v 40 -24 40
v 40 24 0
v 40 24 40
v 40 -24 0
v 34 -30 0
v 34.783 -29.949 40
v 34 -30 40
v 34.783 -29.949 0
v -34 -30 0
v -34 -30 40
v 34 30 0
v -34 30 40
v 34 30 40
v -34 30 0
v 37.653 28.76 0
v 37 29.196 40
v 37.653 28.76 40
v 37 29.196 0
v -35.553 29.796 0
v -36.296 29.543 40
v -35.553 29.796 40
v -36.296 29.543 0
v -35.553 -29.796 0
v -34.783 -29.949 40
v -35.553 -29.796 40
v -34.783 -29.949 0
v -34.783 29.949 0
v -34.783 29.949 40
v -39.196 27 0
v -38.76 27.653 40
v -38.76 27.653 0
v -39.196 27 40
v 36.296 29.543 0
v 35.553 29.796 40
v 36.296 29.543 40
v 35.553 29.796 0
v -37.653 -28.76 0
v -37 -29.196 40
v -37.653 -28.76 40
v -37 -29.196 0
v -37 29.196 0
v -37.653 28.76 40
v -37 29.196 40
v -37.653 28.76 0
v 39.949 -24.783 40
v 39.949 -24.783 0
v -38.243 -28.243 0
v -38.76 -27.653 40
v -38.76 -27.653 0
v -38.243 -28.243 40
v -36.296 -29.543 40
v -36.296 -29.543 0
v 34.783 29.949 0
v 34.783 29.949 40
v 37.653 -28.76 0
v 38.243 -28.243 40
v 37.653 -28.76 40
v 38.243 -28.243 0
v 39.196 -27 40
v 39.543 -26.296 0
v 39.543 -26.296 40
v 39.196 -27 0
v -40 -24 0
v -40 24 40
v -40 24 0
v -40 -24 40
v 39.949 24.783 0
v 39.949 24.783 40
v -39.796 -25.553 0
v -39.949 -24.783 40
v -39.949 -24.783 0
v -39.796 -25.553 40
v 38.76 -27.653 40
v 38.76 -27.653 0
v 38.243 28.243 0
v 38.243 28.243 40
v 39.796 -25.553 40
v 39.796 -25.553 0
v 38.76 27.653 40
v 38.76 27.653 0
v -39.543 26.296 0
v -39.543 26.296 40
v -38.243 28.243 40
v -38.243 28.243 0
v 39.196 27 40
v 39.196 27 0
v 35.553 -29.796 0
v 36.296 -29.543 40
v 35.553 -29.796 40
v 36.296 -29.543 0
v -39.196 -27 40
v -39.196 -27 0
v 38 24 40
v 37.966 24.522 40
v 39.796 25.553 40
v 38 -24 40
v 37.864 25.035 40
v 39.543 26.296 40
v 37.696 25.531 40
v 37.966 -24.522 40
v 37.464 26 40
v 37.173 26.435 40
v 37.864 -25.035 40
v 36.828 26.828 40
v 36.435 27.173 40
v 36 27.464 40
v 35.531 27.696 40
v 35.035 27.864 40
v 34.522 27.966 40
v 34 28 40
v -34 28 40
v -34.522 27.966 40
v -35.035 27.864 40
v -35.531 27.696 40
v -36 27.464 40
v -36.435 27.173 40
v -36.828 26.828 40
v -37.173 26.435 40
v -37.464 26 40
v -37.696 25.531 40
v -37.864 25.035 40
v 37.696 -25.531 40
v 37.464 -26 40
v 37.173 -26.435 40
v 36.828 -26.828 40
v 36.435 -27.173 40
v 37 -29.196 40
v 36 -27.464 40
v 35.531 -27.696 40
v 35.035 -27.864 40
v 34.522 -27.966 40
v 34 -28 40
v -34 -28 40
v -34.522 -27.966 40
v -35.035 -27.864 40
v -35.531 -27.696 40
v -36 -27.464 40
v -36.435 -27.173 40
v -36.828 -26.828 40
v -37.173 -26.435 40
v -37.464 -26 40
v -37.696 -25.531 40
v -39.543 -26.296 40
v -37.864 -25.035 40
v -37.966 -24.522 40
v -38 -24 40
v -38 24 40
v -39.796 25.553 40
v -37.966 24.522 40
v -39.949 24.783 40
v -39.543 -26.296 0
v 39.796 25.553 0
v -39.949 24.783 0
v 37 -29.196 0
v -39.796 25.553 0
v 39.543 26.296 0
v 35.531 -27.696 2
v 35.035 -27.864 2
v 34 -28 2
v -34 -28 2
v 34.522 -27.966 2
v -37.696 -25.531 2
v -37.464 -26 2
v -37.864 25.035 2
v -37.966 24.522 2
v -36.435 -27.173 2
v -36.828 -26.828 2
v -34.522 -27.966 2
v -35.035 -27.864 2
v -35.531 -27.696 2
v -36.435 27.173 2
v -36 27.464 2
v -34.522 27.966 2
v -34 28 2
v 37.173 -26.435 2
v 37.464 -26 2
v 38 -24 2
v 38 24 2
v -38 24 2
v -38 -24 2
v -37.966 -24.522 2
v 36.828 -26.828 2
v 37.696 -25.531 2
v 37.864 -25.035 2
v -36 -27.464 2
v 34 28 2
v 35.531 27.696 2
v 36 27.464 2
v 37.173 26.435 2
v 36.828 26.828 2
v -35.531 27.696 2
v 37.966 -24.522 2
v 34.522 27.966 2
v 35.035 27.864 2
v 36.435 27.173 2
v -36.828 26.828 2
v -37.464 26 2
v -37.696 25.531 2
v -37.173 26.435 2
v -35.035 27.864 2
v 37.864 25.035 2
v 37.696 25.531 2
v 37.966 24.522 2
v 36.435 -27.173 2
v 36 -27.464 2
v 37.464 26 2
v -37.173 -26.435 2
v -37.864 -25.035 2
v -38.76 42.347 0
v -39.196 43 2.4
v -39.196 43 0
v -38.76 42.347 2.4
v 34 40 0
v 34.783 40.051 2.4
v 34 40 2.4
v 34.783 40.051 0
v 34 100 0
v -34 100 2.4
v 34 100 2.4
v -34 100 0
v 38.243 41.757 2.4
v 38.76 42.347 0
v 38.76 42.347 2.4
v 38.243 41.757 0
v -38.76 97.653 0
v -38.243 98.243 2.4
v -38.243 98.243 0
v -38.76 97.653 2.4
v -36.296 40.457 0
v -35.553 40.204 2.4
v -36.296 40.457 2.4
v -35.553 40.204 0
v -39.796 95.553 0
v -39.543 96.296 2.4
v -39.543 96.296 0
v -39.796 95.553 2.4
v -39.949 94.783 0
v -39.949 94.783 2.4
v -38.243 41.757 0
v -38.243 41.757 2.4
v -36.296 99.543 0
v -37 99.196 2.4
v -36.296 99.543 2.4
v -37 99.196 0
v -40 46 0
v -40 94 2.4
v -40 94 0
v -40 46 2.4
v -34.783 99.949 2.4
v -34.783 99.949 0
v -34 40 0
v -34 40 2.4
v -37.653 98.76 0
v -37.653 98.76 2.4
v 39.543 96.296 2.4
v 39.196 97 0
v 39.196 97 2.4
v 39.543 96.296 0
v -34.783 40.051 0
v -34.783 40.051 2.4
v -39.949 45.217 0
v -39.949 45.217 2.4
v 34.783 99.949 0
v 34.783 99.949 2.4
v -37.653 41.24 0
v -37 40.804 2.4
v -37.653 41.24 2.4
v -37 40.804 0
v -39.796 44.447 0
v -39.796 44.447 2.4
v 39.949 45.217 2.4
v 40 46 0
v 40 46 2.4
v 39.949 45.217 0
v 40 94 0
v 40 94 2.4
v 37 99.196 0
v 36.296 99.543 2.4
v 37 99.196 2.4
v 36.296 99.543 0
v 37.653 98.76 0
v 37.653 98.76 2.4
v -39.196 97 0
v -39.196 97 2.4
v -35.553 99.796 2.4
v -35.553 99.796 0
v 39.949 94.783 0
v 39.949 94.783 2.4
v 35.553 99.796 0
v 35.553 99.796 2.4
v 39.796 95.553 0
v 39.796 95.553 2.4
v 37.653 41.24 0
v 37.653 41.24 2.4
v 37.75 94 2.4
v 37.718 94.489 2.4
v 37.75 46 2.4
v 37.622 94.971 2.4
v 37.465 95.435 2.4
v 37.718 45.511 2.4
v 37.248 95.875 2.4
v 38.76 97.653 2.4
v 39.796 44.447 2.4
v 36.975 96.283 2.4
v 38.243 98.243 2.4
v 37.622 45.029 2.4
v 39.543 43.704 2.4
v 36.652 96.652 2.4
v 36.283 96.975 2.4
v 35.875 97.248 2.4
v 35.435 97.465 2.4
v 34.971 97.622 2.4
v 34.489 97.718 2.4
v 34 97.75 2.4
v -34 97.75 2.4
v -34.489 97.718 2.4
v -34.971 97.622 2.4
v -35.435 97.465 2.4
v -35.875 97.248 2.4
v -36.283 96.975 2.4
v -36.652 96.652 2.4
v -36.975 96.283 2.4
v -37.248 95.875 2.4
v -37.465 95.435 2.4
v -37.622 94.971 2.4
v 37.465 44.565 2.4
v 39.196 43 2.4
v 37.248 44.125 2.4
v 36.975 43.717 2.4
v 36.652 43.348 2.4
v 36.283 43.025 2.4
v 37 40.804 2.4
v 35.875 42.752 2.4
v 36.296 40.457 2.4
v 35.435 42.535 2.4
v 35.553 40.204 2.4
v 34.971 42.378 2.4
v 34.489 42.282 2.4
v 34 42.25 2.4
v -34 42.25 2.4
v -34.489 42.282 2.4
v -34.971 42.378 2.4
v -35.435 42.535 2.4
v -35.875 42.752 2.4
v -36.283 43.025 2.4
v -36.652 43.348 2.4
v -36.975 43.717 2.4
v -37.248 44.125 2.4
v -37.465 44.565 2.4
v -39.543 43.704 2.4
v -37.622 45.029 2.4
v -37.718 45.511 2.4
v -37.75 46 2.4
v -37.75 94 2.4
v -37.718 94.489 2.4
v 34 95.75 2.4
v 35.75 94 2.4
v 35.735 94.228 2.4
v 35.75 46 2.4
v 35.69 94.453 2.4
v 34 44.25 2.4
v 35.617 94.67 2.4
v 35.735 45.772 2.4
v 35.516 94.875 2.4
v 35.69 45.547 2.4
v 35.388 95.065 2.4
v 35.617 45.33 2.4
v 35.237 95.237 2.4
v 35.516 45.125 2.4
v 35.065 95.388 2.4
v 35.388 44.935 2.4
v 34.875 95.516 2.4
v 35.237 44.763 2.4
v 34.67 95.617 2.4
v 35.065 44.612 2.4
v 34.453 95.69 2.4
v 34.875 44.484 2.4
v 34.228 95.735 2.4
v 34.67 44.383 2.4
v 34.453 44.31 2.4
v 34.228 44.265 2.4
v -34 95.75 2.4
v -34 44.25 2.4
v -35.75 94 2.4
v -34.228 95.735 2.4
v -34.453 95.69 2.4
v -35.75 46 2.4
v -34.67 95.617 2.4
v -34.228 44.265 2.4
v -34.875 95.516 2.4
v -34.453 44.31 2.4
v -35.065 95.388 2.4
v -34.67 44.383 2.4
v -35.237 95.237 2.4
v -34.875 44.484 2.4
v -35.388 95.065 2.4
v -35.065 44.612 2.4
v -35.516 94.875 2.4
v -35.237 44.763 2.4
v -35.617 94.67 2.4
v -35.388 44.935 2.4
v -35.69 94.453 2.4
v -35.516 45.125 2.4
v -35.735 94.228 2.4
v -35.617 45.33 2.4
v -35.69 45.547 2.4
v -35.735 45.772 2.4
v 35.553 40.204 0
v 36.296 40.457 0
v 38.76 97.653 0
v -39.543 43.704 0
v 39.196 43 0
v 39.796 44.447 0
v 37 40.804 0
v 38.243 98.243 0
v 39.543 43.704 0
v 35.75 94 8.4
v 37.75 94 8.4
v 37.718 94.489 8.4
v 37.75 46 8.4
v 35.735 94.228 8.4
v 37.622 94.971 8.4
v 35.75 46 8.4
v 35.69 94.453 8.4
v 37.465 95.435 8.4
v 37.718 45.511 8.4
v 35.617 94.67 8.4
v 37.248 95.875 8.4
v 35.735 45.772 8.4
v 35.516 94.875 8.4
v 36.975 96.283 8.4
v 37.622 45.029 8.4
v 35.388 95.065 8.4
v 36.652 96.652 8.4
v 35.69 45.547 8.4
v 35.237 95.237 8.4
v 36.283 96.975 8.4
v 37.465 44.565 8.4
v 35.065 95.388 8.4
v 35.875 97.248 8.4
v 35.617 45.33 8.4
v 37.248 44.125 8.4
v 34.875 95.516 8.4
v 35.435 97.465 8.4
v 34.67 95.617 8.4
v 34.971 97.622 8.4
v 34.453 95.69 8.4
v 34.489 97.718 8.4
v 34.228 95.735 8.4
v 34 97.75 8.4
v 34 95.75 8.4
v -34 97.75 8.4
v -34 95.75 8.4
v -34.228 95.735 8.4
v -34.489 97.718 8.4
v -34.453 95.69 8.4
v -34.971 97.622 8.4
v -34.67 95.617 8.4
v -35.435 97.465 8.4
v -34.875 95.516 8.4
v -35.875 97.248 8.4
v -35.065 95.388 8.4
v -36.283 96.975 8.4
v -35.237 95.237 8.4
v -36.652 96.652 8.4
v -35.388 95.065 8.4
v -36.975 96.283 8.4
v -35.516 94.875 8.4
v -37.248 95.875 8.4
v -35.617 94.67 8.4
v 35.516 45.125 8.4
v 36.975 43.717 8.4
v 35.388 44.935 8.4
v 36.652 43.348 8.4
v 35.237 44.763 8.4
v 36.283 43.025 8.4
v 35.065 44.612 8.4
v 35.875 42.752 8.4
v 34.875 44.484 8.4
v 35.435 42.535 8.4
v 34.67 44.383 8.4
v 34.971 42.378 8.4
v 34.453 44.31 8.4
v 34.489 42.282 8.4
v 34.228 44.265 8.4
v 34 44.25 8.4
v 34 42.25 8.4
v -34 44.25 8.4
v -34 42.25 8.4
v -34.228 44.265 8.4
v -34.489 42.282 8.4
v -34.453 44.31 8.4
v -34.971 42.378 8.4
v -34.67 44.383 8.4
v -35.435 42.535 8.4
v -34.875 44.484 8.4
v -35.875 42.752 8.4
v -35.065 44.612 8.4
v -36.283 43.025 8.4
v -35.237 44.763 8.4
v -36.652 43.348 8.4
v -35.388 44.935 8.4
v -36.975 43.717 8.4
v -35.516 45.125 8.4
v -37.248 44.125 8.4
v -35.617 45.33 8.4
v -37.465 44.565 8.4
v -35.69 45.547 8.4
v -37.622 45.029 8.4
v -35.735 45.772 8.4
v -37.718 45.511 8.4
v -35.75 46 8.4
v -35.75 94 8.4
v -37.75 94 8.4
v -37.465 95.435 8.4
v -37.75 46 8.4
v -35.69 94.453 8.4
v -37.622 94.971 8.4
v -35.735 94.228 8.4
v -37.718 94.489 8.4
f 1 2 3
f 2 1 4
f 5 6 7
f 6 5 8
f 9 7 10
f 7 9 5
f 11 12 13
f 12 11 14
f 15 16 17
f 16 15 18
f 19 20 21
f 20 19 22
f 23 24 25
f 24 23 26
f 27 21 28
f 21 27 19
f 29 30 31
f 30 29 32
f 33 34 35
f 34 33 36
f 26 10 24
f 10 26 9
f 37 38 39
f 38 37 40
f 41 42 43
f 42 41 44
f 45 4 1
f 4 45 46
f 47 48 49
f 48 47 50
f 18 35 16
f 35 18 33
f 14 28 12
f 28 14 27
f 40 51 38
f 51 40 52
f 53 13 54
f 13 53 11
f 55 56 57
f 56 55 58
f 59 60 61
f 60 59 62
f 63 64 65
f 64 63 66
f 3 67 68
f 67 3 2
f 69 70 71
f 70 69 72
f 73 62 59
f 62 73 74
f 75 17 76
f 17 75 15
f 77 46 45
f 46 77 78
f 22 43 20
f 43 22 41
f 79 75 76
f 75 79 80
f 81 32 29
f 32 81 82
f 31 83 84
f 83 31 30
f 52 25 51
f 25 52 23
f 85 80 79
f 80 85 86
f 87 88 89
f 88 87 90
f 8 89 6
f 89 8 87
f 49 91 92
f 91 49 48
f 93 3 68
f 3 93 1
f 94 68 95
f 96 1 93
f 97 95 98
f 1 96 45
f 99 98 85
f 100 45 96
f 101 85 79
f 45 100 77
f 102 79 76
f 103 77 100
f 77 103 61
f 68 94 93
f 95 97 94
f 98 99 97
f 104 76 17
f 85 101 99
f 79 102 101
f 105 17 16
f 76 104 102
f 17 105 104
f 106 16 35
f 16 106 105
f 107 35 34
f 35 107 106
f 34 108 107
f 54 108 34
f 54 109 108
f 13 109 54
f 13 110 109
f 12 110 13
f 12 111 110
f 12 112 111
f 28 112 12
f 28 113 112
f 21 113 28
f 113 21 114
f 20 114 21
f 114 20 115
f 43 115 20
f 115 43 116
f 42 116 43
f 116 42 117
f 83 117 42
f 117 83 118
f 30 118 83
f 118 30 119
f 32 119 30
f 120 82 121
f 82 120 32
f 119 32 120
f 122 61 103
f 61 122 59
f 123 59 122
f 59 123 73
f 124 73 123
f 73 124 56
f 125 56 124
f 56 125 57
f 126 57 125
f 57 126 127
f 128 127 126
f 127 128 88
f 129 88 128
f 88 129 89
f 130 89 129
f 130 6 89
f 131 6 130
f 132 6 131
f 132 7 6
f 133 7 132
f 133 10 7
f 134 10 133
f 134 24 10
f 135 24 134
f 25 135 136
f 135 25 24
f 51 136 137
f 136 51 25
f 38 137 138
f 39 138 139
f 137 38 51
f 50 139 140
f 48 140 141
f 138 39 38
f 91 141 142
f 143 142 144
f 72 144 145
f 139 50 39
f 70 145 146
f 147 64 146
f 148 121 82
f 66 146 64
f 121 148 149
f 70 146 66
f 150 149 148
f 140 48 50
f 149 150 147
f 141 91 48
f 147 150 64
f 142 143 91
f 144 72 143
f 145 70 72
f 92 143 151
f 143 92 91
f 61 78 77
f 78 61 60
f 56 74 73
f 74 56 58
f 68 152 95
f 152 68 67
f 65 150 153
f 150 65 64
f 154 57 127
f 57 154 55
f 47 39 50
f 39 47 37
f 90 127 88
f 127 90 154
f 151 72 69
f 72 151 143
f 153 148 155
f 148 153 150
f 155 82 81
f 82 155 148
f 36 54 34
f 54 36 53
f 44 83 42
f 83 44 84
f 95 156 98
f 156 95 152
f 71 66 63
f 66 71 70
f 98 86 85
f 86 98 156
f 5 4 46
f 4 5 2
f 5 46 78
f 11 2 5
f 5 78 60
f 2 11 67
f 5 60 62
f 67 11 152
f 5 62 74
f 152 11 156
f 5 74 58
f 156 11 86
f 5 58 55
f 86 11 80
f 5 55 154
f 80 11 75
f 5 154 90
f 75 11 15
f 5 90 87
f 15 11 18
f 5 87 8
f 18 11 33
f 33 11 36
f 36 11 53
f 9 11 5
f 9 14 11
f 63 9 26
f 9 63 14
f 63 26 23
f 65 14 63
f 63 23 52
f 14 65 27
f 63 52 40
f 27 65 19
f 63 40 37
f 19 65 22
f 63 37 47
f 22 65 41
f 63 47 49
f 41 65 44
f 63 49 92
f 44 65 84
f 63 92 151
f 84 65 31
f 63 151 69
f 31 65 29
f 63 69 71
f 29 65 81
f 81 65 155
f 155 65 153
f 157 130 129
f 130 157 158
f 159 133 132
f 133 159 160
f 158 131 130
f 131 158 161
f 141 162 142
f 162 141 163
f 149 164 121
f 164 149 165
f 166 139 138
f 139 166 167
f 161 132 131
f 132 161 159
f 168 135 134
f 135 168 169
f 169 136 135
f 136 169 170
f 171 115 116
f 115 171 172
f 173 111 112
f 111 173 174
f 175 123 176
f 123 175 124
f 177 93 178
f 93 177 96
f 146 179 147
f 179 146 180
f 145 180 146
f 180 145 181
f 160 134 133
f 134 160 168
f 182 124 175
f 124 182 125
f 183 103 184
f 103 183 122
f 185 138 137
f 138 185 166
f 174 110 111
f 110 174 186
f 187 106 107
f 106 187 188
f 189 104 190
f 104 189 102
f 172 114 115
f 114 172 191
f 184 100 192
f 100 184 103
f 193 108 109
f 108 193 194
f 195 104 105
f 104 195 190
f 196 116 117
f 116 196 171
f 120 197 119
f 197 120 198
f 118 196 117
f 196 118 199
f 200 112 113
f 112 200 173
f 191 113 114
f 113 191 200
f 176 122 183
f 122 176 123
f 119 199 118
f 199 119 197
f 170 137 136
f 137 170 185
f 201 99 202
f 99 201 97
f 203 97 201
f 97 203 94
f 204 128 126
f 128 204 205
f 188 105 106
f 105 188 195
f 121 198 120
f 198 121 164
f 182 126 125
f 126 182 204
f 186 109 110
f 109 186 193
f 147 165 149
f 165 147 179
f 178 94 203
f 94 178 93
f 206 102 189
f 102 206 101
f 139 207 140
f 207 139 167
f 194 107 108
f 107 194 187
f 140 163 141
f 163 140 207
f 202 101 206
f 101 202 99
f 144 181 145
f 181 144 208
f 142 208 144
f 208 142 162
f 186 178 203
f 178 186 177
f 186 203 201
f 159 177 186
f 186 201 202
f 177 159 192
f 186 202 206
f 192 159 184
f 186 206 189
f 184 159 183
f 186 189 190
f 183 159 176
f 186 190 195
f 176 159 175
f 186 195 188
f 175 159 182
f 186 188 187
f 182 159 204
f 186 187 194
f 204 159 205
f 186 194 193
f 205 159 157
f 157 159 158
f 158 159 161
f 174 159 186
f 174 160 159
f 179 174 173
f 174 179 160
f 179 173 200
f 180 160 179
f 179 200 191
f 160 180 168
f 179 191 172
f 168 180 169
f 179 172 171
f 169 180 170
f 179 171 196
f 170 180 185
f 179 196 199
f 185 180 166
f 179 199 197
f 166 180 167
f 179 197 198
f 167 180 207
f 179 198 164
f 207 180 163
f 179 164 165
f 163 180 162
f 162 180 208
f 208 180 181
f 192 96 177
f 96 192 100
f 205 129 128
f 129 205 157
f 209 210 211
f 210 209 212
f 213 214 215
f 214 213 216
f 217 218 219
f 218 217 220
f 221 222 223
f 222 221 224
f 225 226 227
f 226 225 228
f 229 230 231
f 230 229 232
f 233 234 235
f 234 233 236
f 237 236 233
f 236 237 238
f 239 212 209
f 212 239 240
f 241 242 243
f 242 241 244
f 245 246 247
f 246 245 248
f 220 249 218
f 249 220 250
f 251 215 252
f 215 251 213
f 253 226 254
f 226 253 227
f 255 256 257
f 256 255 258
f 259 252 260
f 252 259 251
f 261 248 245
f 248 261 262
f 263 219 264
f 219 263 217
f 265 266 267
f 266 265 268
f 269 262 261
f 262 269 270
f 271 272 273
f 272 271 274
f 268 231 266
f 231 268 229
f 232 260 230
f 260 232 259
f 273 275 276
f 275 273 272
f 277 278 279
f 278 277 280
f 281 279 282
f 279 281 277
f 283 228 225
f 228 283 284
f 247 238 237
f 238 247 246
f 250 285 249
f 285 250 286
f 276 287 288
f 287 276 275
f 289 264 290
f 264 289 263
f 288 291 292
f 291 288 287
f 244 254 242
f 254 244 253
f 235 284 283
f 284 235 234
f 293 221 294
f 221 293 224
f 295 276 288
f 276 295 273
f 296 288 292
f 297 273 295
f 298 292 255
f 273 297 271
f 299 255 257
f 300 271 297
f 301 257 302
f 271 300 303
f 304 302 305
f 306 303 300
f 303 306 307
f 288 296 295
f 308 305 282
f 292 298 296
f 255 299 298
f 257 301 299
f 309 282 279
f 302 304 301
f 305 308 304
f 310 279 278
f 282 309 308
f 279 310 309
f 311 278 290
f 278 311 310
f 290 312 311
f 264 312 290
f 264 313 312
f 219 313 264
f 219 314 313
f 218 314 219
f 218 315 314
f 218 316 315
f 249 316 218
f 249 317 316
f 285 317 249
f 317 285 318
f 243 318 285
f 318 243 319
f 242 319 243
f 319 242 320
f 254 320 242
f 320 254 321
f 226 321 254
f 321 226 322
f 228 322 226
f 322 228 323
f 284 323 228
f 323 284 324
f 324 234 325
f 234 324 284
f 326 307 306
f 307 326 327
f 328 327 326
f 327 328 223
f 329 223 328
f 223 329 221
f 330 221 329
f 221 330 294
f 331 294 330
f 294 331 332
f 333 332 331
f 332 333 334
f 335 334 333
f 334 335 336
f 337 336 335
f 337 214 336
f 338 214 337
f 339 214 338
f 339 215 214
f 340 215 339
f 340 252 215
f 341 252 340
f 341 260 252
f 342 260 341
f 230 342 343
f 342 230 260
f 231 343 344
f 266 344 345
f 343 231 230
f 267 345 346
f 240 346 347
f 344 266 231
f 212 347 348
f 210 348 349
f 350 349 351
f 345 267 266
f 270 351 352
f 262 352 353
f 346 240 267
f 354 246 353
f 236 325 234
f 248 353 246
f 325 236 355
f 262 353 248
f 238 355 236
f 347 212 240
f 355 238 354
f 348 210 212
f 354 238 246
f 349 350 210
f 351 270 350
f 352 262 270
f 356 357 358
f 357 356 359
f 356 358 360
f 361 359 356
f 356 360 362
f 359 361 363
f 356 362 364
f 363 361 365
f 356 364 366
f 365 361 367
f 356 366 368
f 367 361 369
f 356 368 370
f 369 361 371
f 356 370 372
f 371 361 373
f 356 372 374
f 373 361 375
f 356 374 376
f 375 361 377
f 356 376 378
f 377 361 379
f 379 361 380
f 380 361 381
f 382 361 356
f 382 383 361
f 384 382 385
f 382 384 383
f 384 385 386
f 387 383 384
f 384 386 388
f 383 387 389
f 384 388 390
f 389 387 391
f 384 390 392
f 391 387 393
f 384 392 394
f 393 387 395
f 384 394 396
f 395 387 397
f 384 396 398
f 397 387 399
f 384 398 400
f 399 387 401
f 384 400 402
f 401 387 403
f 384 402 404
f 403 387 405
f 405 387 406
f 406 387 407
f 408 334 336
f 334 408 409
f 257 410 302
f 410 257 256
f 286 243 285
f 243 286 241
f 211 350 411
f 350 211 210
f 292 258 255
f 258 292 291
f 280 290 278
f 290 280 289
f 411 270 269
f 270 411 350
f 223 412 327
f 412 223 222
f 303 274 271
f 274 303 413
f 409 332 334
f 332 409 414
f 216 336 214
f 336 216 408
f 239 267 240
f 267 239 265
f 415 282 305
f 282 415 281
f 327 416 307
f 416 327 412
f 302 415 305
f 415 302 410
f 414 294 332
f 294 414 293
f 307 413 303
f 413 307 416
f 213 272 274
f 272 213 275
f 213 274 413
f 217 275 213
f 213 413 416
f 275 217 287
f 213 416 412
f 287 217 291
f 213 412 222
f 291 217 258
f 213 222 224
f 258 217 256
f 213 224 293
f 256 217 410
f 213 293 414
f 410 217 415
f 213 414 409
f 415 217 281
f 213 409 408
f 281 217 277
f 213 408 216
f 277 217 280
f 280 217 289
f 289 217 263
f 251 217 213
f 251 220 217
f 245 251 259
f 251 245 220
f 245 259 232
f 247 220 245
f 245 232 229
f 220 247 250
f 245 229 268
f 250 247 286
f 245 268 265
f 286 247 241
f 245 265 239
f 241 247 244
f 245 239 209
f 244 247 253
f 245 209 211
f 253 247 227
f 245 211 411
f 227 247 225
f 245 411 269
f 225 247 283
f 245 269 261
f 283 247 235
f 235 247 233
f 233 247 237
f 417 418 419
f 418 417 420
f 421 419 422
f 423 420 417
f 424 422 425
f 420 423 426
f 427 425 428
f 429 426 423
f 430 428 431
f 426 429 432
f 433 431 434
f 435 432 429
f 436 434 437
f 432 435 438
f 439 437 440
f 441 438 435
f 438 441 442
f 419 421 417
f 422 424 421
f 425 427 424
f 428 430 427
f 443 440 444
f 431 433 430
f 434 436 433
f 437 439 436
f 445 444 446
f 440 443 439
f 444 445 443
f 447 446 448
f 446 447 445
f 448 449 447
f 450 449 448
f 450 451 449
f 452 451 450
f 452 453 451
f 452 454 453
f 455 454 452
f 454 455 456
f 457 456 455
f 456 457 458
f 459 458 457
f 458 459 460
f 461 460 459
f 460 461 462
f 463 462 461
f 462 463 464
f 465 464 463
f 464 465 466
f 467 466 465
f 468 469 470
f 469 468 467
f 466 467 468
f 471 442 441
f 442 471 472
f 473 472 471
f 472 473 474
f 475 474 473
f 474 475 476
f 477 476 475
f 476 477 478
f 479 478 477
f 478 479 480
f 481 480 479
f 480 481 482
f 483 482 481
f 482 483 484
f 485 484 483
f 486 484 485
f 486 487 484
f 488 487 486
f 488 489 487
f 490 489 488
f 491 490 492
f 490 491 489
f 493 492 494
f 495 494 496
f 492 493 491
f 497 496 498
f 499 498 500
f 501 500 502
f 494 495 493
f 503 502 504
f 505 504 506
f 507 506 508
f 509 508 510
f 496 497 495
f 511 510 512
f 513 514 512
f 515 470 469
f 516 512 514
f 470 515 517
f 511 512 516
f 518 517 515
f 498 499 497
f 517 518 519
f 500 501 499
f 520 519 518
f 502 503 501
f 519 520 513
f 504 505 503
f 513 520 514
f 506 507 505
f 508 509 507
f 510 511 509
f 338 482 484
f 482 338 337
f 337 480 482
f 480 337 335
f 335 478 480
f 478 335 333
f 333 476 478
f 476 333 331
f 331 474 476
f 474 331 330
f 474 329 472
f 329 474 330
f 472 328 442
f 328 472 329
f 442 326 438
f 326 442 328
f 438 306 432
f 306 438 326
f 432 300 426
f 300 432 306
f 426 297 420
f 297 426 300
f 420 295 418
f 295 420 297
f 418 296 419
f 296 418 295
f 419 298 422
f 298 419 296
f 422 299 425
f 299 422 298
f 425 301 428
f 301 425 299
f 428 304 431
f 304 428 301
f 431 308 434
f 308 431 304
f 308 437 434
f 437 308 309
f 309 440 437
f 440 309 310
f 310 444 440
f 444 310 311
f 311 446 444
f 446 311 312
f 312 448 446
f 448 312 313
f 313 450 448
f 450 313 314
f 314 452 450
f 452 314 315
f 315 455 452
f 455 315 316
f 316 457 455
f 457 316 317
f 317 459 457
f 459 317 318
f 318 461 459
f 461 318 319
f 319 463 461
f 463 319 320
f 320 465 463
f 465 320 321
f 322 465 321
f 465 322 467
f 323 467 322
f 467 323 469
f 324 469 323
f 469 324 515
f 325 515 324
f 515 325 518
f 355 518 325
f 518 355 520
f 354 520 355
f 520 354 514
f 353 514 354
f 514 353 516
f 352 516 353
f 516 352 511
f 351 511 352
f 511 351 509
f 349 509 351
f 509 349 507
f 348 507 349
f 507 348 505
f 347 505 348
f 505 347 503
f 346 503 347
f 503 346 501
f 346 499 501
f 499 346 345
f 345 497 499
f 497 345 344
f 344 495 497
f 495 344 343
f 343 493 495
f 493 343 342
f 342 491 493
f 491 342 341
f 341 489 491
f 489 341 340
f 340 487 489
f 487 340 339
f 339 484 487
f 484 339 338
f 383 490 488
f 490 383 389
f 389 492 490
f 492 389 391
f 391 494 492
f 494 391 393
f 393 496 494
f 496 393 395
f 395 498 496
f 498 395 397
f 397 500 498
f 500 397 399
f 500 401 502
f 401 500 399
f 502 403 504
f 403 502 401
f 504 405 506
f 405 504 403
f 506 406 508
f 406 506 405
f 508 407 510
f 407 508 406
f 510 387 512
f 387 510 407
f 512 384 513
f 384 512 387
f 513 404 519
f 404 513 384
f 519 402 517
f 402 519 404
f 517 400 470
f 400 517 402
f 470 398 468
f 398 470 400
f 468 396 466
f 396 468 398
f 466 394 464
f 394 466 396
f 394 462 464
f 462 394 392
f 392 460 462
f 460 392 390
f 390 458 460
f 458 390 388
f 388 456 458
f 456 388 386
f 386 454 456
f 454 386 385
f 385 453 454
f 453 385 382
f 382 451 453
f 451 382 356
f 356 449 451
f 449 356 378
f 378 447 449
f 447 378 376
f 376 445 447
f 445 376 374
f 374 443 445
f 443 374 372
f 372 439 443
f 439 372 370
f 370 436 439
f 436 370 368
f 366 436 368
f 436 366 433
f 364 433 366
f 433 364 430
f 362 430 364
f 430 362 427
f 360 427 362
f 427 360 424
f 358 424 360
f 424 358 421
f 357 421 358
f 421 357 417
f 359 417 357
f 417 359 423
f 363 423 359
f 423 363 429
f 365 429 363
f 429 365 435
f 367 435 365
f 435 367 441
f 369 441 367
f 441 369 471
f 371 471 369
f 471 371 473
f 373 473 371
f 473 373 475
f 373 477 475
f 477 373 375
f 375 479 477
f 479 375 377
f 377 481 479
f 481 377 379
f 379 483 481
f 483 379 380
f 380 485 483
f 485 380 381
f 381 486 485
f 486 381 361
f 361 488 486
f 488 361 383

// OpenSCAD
// Коробка со скруглёнными углами и крышкой на бортике.
// Крышка печатается рядом, бортиком вверх; зазор задаёт, насколько туго она сидит.
$fn = 48;

/* [Коробка] */
// Ширина, мм
width = 80;             // [30:5:200]
// Глубина, мм
depth = 60;             // [25:5:150]
// Высота, мм
height = 40;            // [15:5:120]
// Толщина стенки, мм
wall = 2;               // [1.2:0.2:5]
// Радиус углов, мм
corner = 6;             // [1:0.5:20]
/* [Крышка] */
// Толщина крышки, мм
lid = 2.4;              // [1.2:0.2:5]
// Высота бортика, мм
lip = 6;                // [2:1:15]
// Зазор бортика, мм
clearance = 0.25;       // [0.1:0.05:0.6]

// Прямоугольник со скруглёнными углами, по центру.
module rounded(w, d, r) {
    rr = max(0.01, min(r, w / 2 - 0.01, d / 2 - 0.01));
    offset(r = rr) square([w - 2 * rr, d - 2 * rr], center = true);
}

module box() {
    difference() {
        linear_extrude(height = height) rounded(width, depth, corner);
        translate([0, 0, wall])
            linear_extrude(height = height) rounded(width - 2 * wall, depth - 2 * wall, corner - wall);
    }
}

module lid_part() {
    inside_w = width - 2 * wall - 2 * clearance;
    inside_d = depth - 2 * wall - 2 * clearance;
    linear_extrude(height = lid) rounded(width, depth, corner);
    translate([0, 0, lid])
        linear_extrude(height = lip)
            difference() {
                rounded(inside_w, inside_d, corner - wall - clearance);
                rounded(inside_w - 2 * wall, inside_d - 2 * wall, corner - 2 * wall - clearance);
            }
}

box();
translate([0, depth + 10, 0]) lid_part();
